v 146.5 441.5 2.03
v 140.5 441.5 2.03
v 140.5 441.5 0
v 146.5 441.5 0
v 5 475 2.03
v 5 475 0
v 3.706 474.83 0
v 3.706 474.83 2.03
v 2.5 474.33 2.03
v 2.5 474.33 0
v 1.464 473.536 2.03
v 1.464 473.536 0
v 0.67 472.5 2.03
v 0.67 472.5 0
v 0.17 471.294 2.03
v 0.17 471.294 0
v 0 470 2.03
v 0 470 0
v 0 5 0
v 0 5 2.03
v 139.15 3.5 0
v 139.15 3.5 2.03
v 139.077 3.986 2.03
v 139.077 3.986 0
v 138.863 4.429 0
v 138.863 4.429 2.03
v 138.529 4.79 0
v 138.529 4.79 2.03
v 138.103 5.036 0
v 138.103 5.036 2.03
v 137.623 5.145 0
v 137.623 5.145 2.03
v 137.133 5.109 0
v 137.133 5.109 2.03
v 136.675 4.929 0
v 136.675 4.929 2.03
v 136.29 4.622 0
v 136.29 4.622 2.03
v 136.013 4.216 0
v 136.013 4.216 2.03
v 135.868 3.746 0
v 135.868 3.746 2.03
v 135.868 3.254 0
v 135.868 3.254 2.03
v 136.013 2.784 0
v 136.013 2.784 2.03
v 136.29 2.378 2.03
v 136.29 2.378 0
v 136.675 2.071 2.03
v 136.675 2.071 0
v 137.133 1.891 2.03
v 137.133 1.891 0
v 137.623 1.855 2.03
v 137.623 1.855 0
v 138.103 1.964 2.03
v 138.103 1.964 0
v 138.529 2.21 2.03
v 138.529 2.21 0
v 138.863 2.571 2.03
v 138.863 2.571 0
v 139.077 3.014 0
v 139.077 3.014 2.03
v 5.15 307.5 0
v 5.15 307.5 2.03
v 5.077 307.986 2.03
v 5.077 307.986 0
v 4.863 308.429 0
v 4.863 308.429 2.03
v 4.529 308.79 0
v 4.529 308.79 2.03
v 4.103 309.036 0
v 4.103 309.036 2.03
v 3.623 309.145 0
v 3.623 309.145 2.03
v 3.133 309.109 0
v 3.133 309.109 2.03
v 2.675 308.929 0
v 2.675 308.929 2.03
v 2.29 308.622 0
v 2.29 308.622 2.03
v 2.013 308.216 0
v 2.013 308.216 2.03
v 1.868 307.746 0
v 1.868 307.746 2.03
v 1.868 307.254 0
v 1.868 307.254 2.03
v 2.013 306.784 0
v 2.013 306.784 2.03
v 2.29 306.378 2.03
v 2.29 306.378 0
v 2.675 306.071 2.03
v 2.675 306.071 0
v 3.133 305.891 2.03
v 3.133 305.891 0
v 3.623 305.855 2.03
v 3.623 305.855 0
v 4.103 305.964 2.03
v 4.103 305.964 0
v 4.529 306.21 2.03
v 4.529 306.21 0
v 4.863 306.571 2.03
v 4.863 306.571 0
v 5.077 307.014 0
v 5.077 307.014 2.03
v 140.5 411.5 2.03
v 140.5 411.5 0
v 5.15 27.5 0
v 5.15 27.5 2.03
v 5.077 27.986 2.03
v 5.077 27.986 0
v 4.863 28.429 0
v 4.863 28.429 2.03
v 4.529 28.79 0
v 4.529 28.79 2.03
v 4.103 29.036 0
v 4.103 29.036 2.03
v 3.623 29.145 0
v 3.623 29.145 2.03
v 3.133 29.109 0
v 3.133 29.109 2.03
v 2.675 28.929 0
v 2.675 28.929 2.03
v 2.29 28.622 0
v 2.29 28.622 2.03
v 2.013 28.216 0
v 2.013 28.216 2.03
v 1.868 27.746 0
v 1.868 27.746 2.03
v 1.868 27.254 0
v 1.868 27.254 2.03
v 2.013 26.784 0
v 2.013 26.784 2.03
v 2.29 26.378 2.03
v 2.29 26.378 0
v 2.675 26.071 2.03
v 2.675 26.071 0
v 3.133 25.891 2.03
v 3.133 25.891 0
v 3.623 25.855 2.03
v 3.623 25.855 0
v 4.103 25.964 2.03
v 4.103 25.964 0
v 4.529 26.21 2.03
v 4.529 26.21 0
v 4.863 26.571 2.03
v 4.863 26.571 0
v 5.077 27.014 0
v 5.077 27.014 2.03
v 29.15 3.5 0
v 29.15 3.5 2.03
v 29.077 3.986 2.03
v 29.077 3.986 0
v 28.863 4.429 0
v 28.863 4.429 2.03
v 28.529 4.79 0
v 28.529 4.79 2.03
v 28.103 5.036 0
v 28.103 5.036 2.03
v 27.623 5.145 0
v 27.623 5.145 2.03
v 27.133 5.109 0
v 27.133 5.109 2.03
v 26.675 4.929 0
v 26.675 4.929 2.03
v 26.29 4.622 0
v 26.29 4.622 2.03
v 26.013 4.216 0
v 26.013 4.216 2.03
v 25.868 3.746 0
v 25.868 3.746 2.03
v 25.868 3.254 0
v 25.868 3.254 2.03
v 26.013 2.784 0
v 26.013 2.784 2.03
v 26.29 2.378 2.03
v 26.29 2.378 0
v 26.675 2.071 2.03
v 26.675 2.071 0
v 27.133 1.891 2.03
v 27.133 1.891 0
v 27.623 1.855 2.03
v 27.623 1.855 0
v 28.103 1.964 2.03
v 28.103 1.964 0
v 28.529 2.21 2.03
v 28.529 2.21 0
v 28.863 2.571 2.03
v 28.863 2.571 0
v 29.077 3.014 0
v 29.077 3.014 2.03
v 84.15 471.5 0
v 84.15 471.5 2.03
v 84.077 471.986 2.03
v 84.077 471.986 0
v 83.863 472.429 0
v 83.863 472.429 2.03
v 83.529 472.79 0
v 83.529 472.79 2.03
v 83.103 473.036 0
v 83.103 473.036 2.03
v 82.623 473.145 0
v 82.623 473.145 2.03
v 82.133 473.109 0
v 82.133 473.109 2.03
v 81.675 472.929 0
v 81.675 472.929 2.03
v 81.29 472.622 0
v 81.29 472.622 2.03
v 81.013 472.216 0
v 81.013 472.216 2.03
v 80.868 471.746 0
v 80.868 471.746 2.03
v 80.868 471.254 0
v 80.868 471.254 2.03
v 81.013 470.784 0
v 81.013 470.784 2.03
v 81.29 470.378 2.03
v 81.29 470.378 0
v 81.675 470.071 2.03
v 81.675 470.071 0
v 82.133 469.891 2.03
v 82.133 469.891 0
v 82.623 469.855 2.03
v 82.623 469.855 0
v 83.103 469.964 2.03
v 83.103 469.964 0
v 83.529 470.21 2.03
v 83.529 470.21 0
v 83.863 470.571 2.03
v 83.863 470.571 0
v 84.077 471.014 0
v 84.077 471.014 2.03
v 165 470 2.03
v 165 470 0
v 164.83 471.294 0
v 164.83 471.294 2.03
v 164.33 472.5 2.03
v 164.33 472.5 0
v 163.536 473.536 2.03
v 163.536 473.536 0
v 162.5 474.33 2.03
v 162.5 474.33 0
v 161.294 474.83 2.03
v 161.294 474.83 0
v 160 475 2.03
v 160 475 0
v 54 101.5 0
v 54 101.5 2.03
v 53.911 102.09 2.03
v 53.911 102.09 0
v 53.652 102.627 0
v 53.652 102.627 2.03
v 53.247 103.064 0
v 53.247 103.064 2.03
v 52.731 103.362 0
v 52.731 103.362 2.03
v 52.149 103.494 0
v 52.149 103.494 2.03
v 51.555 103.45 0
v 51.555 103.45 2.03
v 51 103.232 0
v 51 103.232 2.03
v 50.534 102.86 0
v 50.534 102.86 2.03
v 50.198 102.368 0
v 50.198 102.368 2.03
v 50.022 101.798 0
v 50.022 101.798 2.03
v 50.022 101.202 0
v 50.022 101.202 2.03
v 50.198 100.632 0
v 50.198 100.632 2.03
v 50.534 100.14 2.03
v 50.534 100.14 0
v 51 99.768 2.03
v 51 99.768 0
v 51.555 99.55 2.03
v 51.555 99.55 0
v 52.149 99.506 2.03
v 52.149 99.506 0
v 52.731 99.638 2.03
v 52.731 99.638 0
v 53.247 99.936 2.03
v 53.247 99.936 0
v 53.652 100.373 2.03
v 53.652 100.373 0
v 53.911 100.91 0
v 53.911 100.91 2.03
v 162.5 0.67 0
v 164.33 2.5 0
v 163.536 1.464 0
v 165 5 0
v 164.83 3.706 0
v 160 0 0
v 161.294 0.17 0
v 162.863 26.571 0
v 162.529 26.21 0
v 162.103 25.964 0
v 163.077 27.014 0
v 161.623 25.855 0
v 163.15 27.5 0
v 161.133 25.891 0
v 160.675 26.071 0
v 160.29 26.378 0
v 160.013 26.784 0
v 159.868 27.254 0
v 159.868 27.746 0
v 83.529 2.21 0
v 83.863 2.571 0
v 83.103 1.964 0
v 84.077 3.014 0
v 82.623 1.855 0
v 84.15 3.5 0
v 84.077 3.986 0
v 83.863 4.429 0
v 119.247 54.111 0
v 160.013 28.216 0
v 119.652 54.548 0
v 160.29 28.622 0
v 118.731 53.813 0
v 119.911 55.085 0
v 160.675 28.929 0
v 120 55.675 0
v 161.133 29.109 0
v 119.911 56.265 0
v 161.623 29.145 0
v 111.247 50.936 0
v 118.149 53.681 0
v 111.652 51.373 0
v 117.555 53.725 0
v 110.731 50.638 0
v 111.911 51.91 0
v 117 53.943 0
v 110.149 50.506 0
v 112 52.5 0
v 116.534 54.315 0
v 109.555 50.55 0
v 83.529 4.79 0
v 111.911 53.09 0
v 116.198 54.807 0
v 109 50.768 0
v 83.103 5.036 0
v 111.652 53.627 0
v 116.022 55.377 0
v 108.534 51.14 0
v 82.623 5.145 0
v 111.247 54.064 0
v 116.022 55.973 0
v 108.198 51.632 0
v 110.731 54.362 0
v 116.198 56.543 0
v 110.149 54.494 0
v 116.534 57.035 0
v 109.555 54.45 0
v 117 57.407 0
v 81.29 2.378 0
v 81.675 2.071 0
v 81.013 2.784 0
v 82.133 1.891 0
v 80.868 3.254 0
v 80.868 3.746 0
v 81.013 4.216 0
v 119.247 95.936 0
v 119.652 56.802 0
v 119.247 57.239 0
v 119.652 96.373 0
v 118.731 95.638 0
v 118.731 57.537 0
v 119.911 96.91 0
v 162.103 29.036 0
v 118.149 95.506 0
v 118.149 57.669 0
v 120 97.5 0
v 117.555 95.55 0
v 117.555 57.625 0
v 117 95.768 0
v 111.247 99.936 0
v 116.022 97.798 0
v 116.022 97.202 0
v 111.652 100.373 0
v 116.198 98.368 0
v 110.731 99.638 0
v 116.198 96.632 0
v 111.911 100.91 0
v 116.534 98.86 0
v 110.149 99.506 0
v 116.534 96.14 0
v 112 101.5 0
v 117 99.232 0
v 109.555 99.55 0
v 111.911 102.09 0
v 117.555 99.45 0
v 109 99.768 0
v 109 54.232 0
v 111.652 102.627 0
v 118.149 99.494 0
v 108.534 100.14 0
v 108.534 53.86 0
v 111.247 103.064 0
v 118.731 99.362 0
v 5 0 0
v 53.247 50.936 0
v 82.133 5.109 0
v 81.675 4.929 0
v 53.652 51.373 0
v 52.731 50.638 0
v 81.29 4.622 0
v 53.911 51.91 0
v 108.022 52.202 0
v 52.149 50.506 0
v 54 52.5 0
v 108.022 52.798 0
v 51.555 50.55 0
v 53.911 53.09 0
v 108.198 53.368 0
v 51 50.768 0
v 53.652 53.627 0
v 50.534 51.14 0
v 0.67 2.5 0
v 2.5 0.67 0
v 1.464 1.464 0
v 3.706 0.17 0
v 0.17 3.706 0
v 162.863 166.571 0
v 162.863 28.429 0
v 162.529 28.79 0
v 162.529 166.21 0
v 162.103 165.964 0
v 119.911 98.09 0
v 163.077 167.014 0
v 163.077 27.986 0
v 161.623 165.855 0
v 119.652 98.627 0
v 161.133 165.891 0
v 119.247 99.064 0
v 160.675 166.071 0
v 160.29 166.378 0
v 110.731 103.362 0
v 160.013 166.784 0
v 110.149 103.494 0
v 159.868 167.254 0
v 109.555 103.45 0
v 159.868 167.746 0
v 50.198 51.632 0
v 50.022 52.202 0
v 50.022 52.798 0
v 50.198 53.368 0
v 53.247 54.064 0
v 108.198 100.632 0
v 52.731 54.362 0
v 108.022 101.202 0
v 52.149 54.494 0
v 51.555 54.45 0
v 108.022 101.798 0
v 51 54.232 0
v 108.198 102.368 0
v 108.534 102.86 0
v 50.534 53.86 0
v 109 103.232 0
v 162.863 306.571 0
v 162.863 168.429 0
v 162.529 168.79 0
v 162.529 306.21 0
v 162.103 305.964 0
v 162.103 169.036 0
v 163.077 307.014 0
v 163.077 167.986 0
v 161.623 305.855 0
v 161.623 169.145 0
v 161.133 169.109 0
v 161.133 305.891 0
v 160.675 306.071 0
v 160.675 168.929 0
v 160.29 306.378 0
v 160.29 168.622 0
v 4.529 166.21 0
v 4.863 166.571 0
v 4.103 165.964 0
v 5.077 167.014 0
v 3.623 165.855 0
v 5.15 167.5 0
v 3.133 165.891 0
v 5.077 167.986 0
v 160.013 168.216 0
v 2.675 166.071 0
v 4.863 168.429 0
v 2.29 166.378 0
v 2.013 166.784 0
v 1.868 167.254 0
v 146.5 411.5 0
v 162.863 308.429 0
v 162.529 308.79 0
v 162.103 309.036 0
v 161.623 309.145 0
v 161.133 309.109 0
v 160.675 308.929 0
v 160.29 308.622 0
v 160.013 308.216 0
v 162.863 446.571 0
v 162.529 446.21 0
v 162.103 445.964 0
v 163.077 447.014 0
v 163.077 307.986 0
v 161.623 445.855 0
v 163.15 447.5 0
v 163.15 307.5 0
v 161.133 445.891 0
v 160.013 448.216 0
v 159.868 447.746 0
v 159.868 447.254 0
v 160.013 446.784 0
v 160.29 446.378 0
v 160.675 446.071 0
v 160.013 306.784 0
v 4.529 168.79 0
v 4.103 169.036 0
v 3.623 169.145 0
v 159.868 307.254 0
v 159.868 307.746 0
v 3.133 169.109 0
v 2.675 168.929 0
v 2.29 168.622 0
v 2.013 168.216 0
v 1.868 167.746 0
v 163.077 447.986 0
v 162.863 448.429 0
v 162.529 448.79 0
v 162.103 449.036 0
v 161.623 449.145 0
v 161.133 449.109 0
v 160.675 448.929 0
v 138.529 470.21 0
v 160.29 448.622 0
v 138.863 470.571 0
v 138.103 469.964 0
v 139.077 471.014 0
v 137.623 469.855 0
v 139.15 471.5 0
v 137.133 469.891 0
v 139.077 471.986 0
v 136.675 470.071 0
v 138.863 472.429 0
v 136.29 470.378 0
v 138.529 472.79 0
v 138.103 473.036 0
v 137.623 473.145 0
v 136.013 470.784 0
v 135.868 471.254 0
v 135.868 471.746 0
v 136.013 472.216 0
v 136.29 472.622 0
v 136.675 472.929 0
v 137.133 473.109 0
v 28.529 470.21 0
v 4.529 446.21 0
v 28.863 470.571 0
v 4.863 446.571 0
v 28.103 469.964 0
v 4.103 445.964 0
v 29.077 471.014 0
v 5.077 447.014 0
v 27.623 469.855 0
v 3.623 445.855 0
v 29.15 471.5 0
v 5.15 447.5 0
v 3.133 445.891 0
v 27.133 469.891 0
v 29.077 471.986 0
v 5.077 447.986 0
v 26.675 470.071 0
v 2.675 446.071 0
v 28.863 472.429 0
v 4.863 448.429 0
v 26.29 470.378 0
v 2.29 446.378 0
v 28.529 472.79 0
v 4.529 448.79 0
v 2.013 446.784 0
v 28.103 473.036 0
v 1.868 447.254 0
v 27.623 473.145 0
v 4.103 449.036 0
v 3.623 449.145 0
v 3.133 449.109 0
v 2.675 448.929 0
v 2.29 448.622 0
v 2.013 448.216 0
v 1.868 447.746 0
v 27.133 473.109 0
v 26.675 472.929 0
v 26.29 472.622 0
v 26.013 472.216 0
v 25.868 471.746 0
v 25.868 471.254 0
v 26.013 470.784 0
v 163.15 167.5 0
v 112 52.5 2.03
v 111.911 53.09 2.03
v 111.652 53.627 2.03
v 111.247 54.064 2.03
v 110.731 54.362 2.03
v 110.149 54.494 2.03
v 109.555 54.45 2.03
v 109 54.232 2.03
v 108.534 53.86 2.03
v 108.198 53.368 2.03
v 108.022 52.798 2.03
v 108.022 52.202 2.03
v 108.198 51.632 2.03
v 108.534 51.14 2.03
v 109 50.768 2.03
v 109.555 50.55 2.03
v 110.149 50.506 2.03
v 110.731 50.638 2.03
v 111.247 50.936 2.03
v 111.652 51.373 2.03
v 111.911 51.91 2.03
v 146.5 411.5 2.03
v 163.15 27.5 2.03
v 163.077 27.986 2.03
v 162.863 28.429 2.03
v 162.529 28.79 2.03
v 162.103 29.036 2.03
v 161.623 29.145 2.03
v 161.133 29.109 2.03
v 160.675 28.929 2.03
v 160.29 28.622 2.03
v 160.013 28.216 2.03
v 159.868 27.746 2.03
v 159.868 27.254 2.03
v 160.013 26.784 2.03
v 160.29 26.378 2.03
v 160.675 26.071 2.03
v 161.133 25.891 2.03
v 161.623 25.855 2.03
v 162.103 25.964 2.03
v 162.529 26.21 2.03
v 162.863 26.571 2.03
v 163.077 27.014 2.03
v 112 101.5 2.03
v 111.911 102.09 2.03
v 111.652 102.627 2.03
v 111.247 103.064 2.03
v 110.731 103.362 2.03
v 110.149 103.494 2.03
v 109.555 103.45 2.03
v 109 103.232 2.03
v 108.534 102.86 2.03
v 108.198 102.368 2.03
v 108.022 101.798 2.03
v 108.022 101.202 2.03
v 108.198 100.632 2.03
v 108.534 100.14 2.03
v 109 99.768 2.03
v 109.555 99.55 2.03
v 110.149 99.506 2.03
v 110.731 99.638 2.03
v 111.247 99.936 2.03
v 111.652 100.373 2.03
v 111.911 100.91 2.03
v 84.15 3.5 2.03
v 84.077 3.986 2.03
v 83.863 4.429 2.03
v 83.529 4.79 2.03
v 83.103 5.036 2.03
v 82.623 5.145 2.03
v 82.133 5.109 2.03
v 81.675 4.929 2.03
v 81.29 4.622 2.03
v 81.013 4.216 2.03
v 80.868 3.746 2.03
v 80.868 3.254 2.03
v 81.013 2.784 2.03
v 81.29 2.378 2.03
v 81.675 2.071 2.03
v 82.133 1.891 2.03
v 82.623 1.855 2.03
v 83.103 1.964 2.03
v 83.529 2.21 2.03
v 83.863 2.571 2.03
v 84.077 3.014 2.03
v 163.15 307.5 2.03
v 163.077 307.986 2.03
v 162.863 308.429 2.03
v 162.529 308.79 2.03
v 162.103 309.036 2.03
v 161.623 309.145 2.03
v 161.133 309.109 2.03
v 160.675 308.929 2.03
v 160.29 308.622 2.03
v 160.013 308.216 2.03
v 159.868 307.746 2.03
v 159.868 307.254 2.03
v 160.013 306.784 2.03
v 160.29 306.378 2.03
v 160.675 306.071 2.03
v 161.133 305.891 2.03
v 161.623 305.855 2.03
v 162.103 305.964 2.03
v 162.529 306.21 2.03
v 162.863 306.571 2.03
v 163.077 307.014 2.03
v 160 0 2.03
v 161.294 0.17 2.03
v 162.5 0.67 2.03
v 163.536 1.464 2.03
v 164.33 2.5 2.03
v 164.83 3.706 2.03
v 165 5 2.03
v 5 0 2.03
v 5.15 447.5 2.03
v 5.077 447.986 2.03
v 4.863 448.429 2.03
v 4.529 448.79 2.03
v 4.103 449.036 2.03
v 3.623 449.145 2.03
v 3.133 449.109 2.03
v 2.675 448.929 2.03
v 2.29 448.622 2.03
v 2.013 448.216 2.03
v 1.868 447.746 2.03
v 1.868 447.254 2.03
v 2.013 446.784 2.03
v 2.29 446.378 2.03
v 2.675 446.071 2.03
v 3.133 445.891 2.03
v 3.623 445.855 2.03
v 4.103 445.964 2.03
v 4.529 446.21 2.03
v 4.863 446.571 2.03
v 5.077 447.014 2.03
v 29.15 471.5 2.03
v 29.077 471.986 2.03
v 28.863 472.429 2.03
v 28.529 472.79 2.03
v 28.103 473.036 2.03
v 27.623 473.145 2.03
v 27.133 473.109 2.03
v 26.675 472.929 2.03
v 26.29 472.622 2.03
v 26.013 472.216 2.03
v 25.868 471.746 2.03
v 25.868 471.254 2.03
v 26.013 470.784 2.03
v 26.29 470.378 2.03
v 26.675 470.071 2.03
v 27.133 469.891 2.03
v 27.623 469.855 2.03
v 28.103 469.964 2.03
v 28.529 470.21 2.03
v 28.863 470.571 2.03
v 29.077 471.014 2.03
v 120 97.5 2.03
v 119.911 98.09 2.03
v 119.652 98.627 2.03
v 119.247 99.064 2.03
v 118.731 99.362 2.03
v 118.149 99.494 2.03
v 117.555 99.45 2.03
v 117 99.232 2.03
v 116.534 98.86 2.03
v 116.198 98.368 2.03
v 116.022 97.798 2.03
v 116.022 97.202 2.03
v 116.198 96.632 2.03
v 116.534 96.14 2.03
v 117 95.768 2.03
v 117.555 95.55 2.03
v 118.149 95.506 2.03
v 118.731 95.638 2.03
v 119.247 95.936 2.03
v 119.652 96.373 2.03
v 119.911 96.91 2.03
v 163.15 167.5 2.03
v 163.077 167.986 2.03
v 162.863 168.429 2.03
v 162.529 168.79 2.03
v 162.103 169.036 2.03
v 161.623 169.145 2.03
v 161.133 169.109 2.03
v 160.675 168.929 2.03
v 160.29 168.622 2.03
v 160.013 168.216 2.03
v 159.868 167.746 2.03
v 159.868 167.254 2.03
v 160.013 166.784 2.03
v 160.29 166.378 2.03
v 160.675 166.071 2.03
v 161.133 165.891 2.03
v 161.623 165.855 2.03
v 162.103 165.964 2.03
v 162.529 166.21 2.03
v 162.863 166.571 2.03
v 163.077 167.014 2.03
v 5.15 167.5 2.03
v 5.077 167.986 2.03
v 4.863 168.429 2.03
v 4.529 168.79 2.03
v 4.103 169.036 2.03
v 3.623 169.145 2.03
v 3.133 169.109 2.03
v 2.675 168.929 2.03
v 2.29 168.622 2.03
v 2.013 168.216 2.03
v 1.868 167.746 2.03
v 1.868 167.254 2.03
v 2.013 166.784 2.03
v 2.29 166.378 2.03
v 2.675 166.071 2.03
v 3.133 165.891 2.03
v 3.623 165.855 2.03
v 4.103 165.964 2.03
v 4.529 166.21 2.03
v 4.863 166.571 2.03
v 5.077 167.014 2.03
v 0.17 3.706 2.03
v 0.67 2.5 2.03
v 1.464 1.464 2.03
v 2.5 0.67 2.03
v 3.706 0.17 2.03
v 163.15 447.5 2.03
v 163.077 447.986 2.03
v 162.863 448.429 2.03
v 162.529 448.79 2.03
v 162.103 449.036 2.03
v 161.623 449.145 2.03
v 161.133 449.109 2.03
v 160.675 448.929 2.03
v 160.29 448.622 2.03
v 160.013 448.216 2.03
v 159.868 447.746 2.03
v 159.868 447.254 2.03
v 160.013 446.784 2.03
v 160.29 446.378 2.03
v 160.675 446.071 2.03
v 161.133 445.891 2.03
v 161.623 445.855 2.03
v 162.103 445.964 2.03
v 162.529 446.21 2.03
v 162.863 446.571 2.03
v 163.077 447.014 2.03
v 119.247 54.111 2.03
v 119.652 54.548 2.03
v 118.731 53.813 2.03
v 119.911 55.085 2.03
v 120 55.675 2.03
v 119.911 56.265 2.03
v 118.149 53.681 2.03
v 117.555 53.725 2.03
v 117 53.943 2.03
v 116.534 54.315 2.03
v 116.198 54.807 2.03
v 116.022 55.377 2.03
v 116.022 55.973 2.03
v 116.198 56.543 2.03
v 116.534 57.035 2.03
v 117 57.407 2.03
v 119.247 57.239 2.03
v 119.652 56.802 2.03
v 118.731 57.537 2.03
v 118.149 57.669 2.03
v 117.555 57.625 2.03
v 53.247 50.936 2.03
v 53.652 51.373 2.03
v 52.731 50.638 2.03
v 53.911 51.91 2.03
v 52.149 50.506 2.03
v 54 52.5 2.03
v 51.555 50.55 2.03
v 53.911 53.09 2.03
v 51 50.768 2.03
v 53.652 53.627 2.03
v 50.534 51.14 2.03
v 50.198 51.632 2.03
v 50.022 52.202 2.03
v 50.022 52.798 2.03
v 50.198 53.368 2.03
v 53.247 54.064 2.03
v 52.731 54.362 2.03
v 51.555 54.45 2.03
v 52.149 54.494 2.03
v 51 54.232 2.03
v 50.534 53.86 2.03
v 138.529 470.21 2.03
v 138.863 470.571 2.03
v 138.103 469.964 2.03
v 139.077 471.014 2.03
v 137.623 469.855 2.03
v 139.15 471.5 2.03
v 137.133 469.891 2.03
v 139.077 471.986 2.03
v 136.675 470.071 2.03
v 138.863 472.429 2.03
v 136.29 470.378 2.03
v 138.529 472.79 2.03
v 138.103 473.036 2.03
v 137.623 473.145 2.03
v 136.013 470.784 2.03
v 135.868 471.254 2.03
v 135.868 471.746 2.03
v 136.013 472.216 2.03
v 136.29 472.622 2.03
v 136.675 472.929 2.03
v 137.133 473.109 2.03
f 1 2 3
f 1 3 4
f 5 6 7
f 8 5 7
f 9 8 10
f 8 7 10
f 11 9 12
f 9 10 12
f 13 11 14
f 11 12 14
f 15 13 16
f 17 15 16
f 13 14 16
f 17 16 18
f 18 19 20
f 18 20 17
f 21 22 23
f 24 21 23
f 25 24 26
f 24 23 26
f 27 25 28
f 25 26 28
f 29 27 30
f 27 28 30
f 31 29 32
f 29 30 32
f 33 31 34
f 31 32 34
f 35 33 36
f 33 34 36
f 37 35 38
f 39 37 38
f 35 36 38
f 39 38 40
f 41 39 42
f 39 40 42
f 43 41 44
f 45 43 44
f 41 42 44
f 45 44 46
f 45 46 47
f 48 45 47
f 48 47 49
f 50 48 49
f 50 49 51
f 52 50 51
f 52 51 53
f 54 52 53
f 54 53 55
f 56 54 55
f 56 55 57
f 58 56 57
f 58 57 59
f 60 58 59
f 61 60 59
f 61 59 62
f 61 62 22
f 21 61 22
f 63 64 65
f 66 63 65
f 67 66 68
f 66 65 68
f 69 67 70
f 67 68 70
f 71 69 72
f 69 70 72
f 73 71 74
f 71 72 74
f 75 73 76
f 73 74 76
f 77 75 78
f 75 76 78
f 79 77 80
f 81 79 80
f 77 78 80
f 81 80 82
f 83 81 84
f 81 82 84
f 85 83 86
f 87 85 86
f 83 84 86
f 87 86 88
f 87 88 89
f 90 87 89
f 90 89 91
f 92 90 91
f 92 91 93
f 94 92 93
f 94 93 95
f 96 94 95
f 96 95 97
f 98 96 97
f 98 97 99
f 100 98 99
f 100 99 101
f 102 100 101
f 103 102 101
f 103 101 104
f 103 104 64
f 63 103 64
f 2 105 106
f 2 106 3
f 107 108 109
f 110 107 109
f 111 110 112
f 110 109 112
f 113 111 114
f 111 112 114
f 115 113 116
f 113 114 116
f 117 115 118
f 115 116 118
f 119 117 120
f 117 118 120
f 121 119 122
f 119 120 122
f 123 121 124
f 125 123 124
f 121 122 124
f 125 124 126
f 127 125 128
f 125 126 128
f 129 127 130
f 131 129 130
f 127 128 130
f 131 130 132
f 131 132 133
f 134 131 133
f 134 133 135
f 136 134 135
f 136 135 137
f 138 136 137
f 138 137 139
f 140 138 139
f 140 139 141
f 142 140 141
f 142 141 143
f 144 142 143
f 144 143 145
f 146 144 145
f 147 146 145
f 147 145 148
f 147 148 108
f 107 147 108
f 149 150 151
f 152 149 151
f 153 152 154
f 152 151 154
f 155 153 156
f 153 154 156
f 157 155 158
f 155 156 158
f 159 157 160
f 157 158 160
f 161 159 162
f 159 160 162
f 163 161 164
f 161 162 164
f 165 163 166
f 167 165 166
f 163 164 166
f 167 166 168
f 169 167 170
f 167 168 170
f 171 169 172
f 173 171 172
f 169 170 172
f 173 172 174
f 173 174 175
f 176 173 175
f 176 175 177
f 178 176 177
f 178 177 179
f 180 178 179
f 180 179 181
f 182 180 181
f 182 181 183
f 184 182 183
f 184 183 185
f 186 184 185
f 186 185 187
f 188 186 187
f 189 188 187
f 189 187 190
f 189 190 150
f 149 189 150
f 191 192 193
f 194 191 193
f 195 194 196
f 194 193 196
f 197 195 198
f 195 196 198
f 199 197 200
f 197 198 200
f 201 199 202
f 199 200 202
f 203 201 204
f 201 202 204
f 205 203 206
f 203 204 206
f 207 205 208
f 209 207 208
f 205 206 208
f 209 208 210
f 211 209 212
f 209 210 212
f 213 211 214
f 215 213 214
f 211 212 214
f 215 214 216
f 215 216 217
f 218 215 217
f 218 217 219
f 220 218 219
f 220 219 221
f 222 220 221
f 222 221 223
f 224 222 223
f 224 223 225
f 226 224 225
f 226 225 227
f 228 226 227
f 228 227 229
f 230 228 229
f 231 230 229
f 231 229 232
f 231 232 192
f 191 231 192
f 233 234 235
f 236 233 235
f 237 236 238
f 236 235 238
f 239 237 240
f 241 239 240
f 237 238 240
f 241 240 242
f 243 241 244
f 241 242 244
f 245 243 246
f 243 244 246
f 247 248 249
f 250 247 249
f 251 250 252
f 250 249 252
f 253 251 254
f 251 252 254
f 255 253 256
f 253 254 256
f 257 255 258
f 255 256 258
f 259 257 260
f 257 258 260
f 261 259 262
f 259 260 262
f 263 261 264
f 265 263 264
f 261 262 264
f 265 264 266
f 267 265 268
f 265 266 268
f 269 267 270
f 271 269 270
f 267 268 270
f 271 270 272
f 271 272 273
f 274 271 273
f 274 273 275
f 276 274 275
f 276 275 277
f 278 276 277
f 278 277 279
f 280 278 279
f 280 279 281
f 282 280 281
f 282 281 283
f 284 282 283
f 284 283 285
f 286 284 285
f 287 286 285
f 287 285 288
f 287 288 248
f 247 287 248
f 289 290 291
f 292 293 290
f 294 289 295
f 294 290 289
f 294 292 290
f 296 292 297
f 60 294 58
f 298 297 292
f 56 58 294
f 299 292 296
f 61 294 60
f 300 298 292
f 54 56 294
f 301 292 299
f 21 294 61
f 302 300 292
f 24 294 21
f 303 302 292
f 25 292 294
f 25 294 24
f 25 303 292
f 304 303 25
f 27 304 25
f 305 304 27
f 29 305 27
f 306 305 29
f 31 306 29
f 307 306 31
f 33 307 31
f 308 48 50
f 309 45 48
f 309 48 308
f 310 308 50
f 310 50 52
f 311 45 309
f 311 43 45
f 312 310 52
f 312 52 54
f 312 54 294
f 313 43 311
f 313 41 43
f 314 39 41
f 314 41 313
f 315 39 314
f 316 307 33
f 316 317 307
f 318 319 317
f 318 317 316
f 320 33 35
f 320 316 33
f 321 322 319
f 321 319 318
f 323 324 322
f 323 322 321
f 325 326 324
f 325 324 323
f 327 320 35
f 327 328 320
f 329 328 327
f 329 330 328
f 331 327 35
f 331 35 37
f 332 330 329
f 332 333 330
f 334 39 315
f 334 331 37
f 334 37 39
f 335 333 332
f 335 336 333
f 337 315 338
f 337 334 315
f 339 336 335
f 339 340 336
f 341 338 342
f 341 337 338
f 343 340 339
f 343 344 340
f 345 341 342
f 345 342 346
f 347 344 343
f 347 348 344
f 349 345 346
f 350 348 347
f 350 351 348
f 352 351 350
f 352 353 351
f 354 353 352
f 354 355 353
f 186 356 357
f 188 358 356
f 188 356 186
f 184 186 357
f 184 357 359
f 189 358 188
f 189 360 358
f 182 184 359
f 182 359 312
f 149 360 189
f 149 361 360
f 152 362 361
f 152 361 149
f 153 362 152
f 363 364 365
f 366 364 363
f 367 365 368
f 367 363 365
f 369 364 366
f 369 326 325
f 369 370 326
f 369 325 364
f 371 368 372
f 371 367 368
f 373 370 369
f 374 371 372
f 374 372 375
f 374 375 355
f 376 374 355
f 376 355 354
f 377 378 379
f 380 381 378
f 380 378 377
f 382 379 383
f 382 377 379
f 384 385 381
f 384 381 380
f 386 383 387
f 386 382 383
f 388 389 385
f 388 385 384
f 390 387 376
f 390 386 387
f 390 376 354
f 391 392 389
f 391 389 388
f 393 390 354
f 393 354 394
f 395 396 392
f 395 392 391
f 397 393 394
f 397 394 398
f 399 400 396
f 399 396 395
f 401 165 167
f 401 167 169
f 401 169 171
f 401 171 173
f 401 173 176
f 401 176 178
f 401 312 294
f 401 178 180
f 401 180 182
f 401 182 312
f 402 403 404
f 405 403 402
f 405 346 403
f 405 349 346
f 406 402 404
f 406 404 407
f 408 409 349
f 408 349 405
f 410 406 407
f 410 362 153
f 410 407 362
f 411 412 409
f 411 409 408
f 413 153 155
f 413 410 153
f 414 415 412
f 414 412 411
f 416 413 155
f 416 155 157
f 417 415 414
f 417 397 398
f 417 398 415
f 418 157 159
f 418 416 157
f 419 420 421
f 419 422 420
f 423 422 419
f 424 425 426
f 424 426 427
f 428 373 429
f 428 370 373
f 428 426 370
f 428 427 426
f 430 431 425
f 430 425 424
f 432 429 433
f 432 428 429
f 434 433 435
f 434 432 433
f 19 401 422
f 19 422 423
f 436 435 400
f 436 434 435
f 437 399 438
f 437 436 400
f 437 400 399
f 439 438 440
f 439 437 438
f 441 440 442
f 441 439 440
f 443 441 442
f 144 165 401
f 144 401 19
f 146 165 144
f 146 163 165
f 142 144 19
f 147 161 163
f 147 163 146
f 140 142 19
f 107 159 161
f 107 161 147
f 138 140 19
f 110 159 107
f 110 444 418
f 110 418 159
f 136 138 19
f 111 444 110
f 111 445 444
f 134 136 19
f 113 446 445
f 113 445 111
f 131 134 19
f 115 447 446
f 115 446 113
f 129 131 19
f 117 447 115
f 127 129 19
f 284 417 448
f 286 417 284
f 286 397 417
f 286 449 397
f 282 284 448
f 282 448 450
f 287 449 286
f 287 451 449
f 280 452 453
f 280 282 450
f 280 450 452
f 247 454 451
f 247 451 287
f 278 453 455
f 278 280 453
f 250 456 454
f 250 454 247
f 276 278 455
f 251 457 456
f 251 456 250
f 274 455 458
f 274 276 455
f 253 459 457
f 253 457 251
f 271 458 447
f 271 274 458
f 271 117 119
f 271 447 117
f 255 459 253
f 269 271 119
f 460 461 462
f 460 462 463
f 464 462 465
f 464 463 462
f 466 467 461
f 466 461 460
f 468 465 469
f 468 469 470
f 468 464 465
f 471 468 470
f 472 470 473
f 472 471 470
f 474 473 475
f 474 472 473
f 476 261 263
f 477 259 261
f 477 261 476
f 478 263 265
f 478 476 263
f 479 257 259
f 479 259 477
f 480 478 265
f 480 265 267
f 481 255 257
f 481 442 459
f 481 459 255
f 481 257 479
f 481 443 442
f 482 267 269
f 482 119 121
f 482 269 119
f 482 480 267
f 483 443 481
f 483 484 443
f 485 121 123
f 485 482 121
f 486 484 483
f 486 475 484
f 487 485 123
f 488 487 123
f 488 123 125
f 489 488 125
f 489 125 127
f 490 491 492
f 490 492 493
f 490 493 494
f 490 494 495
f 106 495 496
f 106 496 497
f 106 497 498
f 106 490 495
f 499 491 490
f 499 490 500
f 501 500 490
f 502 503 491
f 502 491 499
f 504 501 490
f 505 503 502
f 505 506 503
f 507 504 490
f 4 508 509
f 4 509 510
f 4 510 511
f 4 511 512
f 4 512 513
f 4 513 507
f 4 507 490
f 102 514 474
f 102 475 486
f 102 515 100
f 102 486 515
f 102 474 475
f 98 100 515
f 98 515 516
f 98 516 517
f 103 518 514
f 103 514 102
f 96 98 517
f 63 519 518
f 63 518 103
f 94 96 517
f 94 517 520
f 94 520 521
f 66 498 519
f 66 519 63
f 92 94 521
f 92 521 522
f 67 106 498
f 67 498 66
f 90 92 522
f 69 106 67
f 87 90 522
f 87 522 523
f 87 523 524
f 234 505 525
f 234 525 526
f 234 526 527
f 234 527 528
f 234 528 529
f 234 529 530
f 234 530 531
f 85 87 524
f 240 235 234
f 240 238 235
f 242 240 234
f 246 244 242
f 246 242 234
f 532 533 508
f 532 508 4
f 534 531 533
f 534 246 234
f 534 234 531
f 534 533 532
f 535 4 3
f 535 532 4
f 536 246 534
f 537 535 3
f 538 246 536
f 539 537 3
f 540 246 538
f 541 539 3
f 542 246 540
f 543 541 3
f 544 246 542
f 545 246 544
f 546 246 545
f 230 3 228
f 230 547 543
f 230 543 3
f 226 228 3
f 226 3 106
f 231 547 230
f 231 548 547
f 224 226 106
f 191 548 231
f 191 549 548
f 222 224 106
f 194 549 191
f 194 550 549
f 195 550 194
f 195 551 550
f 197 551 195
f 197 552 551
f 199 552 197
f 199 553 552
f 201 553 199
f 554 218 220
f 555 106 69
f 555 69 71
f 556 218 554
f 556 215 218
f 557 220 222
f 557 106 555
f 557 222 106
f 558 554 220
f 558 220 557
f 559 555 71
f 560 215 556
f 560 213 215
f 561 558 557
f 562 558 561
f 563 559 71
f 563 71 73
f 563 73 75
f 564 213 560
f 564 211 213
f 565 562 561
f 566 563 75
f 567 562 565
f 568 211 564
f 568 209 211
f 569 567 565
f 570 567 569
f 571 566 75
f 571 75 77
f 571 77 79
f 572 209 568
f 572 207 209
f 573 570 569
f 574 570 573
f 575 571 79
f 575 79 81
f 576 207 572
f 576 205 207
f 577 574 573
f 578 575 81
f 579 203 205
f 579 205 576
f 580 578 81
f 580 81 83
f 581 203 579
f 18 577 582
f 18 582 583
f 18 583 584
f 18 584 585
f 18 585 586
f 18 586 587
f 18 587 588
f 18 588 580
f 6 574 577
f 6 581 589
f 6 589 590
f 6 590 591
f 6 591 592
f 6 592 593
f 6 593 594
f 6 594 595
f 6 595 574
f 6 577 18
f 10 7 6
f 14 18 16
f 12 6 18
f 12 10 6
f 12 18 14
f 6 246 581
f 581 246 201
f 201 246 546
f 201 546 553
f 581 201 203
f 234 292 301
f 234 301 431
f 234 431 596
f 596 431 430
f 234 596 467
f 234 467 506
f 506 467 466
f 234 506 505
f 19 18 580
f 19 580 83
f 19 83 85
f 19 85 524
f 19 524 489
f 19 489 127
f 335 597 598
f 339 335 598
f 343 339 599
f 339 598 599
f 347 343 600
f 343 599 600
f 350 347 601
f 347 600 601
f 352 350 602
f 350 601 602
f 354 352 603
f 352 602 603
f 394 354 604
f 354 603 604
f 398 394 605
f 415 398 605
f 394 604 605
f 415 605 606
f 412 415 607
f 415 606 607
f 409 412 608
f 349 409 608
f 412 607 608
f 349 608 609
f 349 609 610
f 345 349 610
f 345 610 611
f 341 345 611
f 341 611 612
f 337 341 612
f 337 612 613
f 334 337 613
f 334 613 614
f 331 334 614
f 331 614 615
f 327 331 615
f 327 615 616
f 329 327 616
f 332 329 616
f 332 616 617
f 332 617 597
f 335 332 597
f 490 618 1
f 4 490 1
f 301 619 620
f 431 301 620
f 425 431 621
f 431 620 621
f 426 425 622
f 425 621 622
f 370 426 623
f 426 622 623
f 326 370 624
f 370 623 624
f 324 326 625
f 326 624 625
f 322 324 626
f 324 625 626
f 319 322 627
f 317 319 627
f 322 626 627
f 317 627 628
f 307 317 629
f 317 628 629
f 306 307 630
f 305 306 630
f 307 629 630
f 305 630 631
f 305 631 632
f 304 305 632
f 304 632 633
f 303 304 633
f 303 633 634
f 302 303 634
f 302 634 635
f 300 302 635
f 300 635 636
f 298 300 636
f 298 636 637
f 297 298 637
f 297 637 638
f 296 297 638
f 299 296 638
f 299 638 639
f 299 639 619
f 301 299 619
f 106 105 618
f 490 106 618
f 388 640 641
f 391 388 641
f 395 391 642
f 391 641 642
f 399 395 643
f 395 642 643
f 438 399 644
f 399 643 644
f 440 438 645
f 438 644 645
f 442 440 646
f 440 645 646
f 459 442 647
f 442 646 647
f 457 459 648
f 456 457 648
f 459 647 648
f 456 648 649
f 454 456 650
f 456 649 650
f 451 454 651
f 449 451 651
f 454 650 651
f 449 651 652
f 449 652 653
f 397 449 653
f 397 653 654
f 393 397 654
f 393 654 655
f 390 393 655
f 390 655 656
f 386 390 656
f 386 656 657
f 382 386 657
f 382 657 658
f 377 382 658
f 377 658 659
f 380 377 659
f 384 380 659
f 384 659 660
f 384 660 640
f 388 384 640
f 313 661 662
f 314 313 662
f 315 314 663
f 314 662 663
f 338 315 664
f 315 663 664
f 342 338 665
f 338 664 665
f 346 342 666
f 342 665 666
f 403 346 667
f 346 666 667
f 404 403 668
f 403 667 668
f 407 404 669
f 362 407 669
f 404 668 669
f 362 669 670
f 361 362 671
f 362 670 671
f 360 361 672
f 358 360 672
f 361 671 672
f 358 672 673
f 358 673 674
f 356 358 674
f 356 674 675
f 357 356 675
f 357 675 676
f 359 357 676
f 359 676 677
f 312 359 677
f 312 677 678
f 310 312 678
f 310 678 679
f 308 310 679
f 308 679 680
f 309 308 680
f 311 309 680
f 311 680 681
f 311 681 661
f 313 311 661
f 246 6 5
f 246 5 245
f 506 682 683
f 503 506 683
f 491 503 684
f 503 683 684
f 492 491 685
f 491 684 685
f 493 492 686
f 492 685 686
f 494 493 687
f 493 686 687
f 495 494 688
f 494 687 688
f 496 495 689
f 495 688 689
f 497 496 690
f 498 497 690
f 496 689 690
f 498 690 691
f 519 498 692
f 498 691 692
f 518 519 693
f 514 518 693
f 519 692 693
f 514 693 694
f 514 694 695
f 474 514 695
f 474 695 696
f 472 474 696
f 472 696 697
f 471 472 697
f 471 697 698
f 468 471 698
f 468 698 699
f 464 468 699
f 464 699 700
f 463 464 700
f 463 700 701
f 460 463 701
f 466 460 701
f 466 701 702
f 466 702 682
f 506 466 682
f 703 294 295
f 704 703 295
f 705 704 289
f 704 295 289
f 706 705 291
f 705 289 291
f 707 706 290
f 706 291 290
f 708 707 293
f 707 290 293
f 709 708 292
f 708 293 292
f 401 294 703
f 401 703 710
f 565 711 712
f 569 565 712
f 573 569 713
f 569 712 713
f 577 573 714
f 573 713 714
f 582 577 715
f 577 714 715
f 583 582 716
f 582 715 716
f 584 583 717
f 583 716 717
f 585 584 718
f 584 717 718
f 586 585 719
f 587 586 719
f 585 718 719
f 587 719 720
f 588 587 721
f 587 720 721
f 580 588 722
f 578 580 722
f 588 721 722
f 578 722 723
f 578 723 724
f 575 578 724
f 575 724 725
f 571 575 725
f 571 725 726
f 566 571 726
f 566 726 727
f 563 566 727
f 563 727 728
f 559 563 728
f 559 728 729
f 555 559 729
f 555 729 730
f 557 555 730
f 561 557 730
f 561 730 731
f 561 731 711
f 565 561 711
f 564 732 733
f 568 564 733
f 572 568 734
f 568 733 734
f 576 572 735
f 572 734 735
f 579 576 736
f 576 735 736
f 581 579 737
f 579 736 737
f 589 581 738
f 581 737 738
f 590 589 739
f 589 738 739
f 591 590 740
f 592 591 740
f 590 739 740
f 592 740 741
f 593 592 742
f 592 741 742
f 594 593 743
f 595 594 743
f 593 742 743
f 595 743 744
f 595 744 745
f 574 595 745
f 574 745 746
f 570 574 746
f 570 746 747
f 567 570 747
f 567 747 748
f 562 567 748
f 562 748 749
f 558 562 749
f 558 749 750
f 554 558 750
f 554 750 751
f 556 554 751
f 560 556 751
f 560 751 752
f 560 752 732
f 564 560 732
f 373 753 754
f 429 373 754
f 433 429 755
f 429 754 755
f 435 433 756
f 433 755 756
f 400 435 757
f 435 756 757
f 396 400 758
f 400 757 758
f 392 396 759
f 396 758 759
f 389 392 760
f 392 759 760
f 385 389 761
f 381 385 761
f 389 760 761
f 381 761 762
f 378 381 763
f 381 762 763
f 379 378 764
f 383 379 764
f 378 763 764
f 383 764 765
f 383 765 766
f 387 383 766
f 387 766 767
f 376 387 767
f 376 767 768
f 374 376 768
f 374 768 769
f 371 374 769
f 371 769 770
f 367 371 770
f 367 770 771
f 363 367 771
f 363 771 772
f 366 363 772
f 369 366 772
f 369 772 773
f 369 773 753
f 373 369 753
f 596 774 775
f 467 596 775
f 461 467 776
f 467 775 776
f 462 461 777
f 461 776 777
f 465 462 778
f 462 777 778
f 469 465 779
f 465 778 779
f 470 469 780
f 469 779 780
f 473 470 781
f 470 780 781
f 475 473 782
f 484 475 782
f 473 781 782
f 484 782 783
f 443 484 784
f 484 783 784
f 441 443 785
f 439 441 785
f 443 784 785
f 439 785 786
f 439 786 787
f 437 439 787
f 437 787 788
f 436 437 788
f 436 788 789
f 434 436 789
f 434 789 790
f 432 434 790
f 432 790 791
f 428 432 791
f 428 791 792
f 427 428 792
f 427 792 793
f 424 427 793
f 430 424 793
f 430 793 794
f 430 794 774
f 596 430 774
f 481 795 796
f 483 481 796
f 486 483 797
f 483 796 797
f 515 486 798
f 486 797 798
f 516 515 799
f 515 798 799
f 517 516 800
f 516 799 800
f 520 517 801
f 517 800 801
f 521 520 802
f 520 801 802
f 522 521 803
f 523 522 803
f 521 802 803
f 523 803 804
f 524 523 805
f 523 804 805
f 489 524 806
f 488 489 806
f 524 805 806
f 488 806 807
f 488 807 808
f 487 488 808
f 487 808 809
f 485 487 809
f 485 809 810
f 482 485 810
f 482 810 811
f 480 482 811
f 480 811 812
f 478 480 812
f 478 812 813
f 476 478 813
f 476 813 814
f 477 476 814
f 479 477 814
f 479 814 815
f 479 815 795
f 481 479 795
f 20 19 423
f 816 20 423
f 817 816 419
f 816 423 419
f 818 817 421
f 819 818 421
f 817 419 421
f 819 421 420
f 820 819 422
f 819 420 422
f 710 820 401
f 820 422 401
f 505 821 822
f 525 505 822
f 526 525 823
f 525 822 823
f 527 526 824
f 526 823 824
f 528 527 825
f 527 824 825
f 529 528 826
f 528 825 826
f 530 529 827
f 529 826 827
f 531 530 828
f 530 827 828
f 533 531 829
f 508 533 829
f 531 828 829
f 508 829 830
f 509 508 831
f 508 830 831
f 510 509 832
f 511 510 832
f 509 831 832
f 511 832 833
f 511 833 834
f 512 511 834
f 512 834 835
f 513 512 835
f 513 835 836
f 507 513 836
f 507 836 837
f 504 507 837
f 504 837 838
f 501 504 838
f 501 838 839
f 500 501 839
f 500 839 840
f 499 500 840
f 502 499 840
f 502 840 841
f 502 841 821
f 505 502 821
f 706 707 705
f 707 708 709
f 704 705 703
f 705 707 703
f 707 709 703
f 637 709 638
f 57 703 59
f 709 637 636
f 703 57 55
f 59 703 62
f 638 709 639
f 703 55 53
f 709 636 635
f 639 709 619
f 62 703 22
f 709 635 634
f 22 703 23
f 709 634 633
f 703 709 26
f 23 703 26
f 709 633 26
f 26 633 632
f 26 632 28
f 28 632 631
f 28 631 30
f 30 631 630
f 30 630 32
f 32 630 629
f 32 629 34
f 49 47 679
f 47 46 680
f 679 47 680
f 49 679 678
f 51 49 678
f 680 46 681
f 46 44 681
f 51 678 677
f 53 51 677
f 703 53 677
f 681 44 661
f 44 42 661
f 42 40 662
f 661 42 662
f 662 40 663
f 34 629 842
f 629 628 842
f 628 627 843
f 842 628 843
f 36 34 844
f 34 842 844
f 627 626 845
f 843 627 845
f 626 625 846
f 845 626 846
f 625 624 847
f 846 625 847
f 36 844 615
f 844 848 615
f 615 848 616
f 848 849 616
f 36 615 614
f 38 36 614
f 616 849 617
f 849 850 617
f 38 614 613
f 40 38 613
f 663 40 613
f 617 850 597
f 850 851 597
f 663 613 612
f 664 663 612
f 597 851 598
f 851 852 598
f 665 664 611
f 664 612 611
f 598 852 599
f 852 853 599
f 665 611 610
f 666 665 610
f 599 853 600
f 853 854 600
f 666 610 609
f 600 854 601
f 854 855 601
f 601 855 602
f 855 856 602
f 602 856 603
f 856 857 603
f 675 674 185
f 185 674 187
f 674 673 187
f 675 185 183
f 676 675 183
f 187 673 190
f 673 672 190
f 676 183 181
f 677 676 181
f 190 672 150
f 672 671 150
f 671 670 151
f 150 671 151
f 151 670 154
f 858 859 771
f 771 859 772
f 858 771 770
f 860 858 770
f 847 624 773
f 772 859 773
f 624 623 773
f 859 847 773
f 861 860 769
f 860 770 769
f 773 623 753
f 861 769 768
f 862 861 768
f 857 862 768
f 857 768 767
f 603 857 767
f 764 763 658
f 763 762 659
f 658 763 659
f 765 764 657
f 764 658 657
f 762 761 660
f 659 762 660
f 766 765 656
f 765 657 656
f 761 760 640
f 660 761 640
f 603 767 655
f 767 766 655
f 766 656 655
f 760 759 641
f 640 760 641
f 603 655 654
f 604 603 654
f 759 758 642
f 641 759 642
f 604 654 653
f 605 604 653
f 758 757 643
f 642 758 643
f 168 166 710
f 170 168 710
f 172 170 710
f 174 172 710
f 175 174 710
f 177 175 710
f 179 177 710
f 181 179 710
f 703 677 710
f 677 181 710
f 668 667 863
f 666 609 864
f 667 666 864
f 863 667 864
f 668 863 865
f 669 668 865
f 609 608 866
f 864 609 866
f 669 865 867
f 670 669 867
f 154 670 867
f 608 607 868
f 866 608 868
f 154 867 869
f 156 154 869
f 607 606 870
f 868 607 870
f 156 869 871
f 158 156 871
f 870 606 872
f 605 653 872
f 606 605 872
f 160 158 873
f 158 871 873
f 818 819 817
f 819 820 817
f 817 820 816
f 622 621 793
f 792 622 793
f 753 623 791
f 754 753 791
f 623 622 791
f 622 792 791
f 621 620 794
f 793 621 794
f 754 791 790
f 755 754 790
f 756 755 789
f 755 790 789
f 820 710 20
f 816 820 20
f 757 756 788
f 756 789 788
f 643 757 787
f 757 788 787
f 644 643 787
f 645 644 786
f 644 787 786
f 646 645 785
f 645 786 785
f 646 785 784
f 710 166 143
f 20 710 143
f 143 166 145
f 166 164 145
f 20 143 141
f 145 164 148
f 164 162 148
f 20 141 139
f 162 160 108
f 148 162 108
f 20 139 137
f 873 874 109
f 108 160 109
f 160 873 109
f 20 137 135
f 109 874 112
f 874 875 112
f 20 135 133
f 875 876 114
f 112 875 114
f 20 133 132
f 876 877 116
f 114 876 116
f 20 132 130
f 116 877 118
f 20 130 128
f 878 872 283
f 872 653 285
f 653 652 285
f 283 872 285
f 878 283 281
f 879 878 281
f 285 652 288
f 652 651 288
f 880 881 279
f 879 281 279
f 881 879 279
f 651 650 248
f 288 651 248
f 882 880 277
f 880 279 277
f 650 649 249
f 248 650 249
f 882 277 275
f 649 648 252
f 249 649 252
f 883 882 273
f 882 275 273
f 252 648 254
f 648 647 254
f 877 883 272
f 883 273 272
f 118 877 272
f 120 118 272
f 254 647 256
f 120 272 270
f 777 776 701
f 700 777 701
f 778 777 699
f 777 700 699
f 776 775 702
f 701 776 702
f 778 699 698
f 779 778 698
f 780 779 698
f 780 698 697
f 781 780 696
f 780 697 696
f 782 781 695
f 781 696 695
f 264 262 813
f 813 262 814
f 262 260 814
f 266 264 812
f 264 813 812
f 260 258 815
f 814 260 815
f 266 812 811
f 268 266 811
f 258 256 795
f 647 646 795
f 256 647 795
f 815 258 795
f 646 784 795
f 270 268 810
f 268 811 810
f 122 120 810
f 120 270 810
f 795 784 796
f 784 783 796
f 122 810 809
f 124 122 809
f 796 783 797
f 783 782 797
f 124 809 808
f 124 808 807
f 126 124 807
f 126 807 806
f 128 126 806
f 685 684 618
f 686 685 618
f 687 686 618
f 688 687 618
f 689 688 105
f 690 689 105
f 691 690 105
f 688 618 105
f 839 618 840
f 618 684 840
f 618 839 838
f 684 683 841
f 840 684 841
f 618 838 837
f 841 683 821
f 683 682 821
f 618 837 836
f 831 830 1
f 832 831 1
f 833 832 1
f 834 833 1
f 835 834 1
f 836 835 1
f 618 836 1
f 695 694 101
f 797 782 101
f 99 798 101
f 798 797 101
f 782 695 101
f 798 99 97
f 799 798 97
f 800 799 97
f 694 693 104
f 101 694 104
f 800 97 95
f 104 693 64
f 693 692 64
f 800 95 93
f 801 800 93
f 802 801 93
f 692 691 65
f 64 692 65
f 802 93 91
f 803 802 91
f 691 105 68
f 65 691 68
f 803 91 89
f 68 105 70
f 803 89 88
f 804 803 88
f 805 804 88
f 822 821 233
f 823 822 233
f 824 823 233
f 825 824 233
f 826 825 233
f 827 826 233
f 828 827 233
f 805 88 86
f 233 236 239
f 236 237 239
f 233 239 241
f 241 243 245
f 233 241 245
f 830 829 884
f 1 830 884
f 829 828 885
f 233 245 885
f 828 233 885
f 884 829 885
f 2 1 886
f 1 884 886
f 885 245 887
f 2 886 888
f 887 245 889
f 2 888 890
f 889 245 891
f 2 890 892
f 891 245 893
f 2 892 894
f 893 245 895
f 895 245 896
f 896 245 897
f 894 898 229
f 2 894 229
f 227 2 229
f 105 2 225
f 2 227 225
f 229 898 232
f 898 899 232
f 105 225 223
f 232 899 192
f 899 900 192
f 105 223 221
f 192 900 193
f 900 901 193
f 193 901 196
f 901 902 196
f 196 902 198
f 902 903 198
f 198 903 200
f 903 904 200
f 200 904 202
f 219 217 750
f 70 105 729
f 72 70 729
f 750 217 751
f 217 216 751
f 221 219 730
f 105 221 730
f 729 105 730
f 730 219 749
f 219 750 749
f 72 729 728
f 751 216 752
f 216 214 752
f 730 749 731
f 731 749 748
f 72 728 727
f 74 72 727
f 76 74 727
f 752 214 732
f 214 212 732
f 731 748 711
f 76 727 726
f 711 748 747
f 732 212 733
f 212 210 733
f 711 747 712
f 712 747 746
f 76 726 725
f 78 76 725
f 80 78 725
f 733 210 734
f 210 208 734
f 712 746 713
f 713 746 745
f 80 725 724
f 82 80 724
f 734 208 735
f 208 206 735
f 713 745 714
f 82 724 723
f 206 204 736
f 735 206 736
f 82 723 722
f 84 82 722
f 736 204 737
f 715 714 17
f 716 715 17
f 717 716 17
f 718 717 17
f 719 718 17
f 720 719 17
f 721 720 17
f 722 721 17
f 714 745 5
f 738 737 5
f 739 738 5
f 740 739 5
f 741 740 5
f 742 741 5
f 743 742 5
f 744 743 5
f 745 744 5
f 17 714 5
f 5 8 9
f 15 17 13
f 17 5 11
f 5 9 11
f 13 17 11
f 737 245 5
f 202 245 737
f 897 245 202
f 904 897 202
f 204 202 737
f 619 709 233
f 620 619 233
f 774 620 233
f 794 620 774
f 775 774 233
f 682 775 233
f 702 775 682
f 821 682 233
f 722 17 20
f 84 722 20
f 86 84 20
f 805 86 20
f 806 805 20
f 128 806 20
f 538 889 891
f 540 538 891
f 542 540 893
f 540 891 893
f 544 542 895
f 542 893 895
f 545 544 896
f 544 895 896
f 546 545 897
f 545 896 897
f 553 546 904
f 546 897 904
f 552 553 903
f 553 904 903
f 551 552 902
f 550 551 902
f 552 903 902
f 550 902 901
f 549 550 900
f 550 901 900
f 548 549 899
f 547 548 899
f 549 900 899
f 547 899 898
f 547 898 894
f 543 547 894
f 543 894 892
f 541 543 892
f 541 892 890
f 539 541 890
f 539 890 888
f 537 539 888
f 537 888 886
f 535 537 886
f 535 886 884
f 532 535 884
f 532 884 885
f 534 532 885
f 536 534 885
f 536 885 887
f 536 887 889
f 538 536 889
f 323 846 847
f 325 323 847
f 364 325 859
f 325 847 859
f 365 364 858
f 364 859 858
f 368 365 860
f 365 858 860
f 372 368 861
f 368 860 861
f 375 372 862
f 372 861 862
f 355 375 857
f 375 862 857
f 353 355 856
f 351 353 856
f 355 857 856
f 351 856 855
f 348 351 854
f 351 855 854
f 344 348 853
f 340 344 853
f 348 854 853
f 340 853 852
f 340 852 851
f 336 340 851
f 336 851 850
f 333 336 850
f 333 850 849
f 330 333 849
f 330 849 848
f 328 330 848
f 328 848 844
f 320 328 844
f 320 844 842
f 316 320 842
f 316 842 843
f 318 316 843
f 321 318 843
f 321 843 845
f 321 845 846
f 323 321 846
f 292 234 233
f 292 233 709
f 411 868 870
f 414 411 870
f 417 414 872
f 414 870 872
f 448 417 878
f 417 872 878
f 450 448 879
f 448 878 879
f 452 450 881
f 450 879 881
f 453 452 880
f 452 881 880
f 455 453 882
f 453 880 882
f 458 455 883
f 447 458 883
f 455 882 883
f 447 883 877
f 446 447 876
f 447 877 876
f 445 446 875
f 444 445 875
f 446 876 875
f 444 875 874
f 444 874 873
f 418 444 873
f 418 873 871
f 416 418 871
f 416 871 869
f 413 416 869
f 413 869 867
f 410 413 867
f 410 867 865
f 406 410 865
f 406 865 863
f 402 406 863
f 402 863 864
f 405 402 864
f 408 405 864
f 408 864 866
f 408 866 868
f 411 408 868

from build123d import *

# Parameters (mm, degrees)
PAD_DEPTH       = 2.03
SKETCH001_R     = 1.65
POCKET_DEPTH    = 5
SKETCH002_W     = 6
SKETCH002_H     = 30
POCKET001_DEPTH = 5
SKETCH004_R     = 2
POCKET002_DEPTH = 5


with BuildPart() as part:
    # Sketch → Pad (new body)
    with BuildSketch(Plane.XY):
        with BuildLine():
            Line((5, 475), (160, 475))
            ThreePointArc((165, 470), (163.535534, 473.535534), (160, 475))
            Line((165, 470), (165, 5))
            ThreePointArc((160, 0), (163.535534, 1.464466), (165, 5))
            Line((160, 0), (5, 0))
            ThreePointArc((0, 5), (1.464466, 1.464466), (5, 0))
            Line((0, 5), (0, 470))
            ThreePointArc((5, 475), (1.464466, 473.535534), (0, 470))
        make_face()
    extrude(amount=PAD_DEPTH)

    # Sketch001 → Pocket (cut)
    with BuildSketch(Plane.XY.offset(2.03)):
        with Locations((137.5, 3.5)):
            Circle(SKETCH001_R)
        with Locations((27.5, 3.5)):
            Circle(SKETCH001_R)
        with Locations((82.5, 3.5)):
            Circle(SKETCH001_R)
        with Locations((3.5, 27.5)):
            Circle(SKETCH001_R)
        with Locations((161.5, 27.5)):
            Circle(SKETCH001_R)
        with Locations((161.5, 167.5)):
            Circle(SKETCH001_R)
        with Locations((161.5, 307.5)):
            Circle(SKETCH001_R)
        with Locations((3.5, 307.5)):
            Circle(SKETCH001_R)
        with Locations((3.5, 167.5)):
            Circle(SKETCH001_R)
        with Locations((3.5, 447.5)):
            Circle(SKETCH001_R)
        with Locations((27.5, 471.5)):
            Circle(SKETCH001_R)
        with Locations((82.5, 471.5)):
            Circle(SKETCH001_R)
        with Locations((137.5, 471.5)):
            Circle(SKETCH001_R)
        with Locations((161.5, 447.5)):
            Circle(SKETCH001_R)
    extrude(amount=-POCKET_DEPTH, mode=Mode.SUBTRACT)

    # Sketch002 → Pocket001 (cut)
    with BuildSketch(Plane.XY.offset(2.03)):
        with Locations((143.5, 426.5)):
            Rectangle(SKETCH002_W, SKETCH002_H)
    extrude(amount=-POCKET001_DEPTH, mode=Mode.SUBTRACT)

    # Sketch004 → Pocket002 (cut)
    with BuildSketch(Plane.XY.offset(2.03)):
        with Locations((118, 97.5)):
            Circle(SKETCH004_R)
        with Locations((118, 55.675)):
            Circle(SKETCH004_R)
        with Locations((52, 52.5)):
            Circle(SKETCH004_R)
        with Locations((52, 101.5)):
            Circle(SKETCH004_R)
        with Locations((110, 101.5)):
            Circle(SKETCH004_R)
        with Locations((110, 52.5)):
            Circle(SKETCH004_R)
    extrude(amount=-POCKET002_DEPTH, mode=Mode.SUBTRACT)


solid = part.part
